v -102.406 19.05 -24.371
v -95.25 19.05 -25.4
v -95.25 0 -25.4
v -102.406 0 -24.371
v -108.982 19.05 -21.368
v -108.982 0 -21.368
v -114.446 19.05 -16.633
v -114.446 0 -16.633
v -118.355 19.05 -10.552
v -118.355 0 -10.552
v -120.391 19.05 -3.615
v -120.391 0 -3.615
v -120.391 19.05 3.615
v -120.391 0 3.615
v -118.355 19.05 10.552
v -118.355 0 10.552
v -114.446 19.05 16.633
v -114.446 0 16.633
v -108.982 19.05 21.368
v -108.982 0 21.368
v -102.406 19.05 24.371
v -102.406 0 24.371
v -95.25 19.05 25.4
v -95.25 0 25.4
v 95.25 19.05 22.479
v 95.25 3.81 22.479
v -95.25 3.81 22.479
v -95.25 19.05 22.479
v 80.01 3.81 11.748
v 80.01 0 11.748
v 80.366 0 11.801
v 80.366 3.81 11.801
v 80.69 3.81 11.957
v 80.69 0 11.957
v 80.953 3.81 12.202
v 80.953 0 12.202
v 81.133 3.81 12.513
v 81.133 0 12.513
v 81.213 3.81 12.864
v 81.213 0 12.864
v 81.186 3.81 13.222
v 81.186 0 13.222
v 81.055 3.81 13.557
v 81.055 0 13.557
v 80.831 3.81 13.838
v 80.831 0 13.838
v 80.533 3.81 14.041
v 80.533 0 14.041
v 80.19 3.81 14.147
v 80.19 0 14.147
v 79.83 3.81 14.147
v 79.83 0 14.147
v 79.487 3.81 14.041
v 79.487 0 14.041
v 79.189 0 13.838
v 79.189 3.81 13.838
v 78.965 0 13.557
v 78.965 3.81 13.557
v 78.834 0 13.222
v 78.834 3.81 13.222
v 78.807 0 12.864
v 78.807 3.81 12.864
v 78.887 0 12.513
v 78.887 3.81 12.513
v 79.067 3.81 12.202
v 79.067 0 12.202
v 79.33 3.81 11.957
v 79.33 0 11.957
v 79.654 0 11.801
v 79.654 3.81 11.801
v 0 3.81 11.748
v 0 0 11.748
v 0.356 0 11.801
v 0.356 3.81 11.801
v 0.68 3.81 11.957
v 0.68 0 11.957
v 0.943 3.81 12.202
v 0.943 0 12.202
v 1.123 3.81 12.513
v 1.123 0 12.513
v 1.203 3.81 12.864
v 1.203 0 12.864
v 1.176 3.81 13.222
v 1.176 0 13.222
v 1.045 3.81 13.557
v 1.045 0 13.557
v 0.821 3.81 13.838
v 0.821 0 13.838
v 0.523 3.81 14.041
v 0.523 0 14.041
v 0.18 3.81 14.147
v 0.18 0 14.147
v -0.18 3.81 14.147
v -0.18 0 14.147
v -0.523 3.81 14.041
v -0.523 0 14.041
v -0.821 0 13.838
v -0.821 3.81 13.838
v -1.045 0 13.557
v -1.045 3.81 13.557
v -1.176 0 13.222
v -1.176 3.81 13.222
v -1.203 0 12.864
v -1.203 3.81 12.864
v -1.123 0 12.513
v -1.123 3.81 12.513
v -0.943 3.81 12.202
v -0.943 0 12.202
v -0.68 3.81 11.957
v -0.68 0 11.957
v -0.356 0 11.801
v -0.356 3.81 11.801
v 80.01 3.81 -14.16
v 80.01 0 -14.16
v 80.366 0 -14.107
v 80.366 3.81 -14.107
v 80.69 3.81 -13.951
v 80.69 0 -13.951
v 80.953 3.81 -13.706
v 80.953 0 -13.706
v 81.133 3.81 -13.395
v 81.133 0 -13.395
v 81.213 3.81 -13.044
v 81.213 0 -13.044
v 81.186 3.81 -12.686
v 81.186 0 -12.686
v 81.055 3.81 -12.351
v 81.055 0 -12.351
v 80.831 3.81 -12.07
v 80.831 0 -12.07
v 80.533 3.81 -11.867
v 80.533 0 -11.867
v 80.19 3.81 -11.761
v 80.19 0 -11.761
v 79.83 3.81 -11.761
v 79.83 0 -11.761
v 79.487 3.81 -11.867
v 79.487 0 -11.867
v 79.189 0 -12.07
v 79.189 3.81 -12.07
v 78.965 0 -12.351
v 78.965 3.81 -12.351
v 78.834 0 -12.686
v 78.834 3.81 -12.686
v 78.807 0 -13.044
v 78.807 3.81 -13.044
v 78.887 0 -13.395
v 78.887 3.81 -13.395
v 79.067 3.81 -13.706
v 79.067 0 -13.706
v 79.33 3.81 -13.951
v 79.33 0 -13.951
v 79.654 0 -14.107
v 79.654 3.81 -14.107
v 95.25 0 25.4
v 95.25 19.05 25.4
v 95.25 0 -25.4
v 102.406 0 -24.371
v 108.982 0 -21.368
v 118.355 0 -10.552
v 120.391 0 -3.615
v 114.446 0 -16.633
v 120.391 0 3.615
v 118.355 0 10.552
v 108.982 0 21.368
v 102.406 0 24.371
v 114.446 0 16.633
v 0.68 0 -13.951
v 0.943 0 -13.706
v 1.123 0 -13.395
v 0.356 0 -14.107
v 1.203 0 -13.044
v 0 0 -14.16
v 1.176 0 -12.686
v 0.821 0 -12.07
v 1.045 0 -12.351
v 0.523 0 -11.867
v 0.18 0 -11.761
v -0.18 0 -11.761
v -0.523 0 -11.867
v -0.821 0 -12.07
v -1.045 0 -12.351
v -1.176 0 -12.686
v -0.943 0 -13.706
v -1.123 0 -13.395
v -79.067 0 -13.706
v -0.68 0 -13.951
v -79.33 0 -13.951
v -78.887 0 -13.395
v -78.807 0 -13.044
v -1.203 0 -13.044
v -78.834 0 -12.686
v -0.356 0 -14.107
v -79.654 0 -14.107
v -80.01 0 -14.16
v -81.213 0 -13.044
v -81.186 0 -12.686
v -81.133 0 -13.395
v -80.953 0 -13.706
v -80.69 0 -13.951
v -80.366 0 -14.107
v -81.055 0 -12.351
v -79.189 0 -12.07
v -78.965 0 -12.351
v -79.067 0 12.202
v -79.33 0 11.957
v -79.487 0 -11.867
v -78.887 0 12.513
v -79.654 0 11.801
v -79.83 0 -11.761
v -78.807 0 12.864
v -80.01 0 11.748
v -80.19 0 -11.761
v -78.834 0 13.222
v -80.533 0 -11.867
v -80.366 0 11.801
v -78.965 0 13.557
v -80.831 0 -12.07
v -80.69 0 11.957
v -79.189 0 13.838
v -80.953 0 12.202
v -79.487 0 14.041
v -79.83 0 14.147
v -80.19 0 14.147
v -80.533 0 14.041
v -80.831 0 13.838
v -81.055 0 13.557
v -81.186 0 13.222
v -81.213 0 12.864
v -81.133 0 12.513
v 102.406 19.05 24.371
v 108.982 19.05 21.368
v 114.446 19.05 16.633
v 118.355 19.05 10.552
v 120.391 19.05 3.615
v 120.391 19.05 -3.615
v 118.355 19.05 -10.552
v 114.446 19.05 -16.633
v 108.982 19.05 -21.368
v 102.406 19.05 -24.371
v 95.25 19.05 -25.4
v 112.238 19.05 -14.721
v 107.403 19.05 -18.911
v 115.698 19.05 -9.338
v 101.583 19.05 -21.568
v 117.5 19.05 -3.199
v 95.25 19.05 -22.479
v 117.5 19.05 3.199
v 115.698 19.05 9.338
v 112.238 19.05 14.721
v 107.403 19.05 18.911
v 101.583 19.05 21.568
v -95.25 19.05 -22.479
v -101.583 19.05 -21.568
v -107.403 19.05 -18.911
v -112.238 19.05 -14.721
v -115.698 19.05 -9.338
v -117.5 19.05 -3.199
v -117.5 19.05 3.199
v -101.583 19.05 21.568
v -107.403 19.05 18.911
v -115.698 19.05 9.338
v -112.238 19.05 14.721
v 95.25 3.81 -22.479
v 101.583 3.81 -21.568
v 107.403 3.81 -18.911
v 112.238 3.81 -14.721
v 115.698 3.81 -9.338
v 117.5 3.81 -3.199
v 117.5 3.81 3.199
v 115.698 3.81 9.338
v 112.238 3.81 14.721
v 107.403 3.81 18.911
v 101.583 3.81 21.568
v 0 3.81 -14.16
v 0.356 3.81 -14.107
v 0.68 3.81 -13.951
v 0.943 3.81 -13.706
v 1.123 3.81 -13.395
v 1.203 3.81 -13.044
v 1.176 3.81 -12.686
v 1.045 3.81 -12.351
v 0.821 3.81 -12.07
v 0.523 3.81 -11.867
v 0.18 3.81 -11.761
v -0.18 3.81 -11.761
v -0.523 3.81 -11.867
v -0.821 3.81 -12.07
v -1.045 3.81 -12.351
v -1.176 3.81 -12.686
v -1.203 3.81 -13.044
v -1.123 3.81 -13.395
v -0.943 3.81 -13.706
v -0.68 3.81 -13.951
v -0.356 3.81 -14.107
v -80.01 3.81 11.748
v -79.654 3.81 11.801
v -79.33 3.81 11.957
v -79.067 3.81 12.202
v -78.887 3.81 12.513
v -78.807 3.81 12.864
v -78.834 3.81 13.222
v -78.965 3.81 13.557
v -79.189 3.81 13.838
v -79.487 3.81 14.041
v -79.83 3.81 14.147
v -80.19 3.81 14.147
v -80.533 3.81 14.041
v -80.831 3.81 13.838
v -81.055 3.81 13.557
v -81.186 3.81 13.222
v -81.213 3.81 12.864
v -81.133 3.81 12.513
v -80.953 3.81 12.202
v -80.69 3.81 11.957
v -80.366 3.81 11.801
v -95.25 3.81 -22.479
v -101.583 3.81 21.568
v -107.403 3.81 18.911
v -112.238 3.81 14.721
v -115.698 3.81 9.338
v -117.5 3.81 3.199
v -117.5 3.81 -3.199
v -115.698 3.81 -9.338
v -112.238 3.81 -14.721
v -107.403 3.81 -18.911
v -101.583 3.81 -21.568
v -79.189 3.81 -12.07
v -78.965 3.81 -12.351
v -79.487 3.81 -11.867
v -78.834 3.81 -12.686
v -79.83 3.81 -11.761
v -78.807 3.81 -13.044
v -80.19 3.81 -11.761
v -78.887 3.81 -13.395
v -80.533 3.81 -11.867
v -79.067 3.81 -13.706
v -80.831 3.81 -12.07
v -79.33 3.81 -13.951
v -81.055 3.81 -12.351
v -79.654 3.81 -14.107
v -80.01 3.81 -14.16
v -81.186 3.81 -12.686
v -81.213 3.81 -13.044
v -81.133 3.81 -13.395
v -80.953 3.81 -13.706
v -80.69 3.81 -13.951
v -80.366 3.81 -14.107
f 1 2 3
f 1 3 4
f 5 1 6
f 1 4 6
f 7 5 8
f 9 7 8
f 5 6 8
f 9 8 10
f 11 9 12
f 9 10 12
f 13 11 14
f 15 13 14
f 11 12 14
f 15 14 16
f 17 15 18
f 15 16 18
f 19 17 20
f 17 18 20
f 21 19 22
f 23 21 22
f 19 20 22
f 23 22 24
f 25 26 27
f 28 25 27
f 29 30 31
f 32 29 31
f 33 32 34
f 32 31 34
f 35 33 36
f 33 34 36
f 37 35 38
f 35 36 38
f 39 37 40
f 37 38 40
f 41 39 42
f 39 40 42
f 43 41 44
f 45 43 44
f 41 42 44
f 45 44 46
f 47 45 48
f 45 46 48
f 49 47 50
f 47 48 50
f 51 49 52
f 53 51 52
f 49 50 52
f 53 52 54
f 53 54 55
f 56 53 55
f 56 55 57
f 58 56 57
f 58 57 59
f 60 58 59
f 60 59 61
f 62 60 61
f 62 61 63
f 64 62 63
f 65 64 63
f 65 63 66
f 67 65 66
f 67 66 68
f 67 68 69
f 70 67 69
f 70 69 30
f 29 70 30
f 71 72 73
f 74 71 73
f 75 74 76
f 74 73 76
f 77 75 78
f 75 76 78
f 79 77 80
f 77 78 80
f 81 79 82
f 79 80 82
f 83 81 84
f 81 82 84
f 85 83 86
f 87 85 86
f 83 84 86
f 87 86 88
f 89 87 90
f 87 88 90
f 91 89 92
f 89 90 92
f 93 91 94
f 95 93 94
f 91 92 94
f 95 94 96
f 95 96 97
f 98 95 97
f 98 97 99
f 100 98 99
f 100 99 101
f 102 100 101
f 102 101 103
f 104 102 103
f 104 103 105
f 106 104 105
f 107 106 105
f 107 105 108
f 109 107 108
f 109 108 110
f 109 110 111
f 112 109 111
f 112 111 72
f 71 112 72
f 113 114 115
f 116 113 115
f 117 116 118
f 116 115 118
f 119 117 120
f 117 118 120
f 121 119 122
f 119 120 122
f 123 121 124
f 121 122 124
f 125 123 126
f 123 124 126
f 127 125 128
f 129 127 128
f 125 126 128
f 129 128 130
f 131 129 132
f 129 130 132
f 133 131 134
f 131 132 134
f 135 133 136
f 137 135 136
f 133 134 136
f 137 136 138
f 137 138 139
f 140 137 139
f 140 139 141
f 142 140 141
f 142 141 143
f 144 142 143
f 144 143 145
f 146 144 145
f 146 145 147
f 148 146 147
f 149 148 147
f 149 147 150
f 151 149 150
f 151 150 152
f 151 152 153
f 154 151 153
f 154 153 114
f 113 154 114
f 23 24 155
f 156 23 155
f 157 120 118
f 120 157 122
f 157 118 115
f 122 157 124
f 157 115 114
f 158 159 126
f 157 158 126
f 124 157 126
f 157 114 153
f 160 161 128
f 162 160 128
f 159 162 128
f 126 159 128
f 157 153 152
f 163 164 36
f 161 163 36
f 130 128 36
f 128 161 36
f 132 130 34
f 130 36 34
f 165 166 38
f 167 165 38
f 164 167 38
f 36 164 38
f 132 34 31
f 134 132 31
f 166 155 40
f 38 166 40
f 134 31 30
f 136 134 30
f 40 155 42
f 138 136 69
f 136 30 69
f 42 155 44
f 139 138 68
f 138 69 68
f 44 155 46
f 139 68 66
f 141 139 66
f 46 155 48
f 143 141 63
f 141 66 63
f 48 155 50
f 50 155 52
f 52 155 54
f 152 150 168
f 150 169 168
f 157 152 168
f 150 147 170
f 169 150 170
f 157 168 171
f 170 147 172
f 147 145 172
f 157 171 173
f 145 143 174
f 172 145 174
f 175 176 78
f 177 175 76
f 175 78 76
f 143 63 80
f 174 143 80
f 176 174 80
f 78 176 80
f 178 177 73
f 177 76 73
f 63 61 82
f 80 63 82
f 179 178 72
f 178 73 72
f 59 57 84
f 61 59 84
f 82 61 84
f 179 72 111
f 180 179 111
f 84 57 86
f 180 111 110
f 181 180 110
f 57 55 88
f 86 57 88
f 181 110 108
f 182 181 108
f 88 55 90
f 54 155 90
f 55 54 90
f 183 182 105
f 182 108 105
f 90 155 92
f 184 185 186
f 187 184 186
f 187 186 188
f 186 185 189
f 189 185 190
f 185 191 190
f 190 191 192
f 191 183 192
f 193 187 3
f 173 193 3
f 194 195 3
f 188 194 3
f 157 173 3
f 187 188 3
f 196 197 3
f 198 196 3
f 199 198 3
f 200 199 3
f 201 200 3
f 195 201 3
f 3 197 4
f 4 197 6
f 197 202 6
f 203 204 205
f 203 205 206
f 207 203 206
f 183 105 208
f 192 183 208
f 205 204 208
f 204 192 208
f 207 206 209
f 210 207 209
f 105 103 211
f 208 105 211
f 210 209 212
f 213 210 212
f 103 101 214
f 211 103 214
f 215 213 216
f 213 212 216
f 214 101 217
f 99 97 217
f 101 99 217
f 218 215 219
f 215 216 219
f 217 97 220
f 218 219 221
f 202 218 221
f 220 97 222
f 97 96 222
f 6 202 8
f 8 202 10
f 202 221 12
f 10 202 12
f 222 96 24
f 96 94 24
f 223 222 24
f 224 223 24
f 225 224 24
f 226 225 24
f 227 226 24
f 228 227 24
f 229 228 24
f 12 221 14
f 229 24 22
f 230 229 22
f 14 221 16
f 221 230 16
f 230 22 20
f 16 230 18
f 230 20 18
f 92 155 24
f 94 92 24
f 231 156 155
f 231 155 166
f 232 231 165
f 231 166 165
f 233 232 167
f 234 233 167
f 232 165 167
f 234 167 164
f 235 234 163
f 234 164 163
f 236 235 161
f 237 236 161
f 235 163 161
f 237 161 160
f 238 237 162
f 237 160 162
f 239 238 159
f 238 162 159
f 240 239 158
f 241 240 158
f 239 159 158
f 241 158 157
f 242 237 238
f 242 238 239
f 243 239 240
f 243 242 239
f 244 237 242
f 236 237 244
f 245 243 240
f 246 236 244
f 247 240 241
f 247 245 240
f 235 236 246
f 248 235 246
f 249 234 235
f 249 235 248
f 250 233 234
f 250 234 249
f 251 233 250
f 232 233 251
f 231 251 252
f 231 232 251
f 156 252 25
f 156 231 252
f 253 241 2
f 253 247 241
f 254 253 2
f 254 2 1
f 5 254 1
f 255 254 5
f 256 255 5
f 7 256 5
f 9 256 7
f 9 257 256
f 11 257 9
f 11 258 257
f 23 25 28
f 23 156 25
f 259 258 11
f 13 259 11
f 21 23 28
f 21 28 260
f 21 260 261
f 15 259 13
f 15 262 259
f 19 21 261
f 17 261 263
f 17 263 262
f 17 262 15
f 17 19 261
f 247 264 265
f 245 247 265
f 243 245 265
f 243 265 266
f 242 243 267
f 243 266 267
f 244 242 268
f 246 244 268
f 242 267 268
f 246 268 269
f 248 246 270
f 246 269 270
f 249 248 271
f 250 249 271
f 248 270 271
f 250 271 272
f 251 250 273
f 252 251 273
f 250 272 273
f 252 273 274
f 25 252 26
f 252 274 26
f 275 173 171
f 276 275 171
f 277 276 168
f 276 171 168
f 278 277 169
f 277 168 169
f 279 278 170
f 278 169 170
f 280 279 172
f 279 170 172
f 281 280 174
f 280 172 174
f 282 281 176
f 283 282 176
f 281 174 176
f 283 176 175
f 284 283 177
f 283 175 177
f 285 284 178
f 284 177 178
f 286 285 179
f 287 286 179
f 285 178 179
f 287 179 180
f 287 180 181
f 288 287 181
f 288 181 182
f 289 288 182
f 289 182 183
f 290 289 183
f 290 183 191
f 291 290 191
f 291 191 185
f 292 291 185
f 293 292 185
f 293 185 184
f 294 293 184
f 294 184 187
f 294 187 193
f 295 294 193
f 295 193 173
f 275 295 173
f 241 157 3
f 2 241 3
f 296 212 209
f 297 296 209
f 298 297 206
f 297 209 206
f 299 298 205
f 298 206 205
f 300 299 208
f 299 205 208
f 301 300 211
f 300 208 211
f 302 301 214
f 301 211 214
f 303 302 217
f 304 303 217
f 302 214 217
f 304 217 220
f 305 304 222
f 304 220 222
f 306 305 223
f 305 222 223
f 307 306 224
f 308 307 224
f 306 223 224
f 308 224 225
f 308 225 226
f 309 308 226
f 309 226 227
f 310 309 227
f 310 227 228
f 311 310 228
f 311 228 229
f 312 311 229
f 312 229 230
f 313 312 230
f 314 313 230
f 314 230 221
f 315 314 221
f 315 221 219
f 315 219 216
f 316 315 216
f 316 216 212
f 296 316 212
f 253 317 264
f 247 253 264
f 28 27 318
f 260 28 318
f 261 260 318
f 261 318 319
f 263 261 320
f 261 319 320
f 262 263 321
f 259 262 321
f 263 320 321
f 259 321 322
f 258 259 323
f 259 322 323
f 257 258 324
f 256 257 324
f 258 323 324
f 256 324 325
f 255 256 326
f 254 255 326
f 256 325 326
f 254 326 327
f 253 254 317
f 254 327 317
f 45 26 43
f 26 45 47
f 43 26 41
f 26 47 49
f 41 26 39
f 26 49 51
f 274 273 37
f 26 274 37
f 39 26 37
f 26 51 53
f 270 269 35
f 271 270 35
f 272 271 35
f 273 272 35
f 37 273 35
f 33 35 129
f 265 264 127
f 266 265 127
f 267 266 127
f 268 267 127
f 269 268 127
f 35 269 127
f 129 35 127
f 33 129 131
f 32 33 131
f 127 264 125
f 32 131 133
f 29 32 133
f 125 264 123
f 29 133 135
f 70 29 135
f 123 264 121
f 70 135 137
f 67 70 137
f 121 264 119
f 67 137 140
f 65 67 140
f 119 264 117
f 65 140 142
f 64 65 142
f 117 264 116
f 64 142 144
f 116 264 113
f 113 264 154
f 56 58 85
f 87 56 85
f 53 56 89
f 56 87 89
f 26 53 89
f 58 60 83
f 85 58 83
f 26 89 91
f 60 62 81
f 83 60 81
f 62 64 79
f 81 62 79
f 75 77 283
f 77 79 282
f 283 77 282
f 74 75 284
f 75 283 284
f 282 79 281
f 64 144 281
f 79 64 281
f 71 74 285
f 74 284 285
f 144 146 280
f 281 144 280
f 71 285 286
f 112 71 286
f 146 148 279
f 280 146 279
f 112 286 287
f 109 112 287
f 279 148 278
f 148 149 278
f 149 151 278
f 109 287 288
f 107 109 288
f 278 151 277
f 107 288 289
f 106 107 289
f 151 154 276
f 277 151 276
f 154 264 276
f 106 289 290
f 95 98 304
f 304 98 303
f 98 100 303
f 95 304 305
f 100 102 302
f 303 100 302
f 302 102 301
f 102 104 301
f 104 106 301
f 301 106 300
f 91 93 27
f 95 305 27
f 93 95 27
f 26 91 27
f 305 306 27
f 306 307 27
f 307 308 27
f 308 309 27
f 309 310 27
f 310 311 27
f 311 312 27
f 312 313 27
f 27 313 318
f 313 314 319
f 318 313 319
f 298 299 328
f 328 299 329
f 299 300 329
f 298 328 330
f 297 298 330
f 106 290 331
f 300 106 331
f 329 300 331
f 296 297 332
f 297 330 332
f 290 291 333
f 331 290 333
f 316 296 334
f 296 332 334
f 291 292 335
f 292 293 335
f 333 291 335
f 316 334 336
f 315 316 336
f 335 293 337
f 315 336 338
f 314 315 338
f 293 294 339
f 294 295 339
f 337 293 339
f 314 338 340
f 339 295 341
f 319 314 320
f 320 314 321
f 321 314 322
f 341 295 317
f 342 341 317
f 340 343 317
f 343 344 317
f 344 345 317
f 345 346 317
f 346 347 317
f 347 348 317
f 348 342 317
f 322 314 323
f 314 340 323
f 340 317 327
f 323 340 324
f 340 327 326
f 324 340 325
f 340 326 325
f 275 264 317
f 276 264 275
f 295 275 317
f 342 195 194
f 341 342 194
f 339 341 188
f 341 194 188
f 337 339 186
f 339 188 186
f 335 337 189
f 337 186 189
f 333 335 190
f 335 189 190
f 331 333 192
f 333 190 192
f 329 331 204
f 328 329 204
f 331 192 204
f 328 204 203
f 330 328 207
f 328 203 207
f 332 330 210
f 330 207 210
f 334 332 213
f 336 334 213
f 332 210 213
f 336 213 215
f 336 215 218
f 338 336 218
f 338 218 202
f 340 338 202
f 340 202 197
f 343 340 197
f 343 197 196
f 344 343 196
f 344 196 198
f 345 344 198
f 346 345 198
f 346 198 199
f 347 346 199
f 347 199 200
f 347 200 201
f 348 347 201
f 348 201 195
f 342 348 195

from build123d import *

# Parameters (mm, degrees)
MAINBLOCK_DEPTH     = 3.81
BOSS_EXTRUDE1_DEPTH = 19.05
SKETCH3_R           = 1.2065
CUT_EXTRUDE1_DEPTH  = 125.757705173


with BuildPart() as part:
    # Sketch1 → MainBlock (new body)
    with BuildSketch(Plane(origin=(0, 0, 0), x_dir=(1, 0, 0), z_dir=(0, 1, 0))):
        with BuildLine():
            Line((-95.25, 22.479), (95.25, 22.479))
            ThreePointArc((95.25, 22.479), (117.729, 0), (95.25, -22.479))
            Line((95.25, -22.479), (-95.25, -22.479))
            ThreePointArc((-95.25, -22.479), (-117.729, 0), (-95.25, 22.479))
        make_face()
    extrude(amount=MAINBLOCK_DEPTH)

    # Sketch2 → Boss-Extrude1 (add)
    with BuildSketch(Plane.XZ):
        with BuildLine():
            Line((-95.25, 25.4), (95.25, 25.4))
            ThreePointArc((95.25, 25.4), (120.65, 0), (95.25, -25.4))
            Line((95.25, -25.4), (-95.25, -25.4))
            ThreePointArc((-95.25, -25.4), (-120.65, 0), (-95.25, 25.4))
        make_face()
        with BuildLine():
            Line((95.25, 22.479), (-95.25, 22.479))
            ThreePointArc((-95.25, 22.479), (-117.729, 0), (-95.25, -22.479))
            Line((-95.25, -22.479), (95.25, -22.479))
            ThreePointArc((95.25, -22.479), (117.729, 0), (95.25, 22.479))
        make_face(mode=Mode.SUBTRACT)
    extrude(amount=-BOSS_EXTRUDE1_DEPTH)

    # Sketch3 → Cut-Extrude1 (cut, through all)
    with BuildSketch(Plane.XZ):
        with Locations(Location((0, 12.954, 0), (0, 0, 270))):
            Circle(SKETCH3_R)
        with Locations(Location((-80.01, 12.954, 0), (0, 0, 270))):
            Circle(SKETCH3_R)
        with Locations(Location((80.01, 12.954, 0), (0, 0, 270))):
            Circle(SKETCH3_R)
        with Locations(Location((80.01, -12.954, 0), (0, 0, 270))):
            Circle(SKETCH3_R)
        with Locations(Location((-80.01, -12.954, 0), (0, 0, 270))):
            Circle(SKETCH3_R)
        with Locations(Location((0, -12.954, 0), (0, 0, 270))):
            Circle(SKETCH3_R)
    extrude(amount=-CUT_EXTRUDE1_DEPTH, mode=Mode.SUBTRACT)


solid = part.part
